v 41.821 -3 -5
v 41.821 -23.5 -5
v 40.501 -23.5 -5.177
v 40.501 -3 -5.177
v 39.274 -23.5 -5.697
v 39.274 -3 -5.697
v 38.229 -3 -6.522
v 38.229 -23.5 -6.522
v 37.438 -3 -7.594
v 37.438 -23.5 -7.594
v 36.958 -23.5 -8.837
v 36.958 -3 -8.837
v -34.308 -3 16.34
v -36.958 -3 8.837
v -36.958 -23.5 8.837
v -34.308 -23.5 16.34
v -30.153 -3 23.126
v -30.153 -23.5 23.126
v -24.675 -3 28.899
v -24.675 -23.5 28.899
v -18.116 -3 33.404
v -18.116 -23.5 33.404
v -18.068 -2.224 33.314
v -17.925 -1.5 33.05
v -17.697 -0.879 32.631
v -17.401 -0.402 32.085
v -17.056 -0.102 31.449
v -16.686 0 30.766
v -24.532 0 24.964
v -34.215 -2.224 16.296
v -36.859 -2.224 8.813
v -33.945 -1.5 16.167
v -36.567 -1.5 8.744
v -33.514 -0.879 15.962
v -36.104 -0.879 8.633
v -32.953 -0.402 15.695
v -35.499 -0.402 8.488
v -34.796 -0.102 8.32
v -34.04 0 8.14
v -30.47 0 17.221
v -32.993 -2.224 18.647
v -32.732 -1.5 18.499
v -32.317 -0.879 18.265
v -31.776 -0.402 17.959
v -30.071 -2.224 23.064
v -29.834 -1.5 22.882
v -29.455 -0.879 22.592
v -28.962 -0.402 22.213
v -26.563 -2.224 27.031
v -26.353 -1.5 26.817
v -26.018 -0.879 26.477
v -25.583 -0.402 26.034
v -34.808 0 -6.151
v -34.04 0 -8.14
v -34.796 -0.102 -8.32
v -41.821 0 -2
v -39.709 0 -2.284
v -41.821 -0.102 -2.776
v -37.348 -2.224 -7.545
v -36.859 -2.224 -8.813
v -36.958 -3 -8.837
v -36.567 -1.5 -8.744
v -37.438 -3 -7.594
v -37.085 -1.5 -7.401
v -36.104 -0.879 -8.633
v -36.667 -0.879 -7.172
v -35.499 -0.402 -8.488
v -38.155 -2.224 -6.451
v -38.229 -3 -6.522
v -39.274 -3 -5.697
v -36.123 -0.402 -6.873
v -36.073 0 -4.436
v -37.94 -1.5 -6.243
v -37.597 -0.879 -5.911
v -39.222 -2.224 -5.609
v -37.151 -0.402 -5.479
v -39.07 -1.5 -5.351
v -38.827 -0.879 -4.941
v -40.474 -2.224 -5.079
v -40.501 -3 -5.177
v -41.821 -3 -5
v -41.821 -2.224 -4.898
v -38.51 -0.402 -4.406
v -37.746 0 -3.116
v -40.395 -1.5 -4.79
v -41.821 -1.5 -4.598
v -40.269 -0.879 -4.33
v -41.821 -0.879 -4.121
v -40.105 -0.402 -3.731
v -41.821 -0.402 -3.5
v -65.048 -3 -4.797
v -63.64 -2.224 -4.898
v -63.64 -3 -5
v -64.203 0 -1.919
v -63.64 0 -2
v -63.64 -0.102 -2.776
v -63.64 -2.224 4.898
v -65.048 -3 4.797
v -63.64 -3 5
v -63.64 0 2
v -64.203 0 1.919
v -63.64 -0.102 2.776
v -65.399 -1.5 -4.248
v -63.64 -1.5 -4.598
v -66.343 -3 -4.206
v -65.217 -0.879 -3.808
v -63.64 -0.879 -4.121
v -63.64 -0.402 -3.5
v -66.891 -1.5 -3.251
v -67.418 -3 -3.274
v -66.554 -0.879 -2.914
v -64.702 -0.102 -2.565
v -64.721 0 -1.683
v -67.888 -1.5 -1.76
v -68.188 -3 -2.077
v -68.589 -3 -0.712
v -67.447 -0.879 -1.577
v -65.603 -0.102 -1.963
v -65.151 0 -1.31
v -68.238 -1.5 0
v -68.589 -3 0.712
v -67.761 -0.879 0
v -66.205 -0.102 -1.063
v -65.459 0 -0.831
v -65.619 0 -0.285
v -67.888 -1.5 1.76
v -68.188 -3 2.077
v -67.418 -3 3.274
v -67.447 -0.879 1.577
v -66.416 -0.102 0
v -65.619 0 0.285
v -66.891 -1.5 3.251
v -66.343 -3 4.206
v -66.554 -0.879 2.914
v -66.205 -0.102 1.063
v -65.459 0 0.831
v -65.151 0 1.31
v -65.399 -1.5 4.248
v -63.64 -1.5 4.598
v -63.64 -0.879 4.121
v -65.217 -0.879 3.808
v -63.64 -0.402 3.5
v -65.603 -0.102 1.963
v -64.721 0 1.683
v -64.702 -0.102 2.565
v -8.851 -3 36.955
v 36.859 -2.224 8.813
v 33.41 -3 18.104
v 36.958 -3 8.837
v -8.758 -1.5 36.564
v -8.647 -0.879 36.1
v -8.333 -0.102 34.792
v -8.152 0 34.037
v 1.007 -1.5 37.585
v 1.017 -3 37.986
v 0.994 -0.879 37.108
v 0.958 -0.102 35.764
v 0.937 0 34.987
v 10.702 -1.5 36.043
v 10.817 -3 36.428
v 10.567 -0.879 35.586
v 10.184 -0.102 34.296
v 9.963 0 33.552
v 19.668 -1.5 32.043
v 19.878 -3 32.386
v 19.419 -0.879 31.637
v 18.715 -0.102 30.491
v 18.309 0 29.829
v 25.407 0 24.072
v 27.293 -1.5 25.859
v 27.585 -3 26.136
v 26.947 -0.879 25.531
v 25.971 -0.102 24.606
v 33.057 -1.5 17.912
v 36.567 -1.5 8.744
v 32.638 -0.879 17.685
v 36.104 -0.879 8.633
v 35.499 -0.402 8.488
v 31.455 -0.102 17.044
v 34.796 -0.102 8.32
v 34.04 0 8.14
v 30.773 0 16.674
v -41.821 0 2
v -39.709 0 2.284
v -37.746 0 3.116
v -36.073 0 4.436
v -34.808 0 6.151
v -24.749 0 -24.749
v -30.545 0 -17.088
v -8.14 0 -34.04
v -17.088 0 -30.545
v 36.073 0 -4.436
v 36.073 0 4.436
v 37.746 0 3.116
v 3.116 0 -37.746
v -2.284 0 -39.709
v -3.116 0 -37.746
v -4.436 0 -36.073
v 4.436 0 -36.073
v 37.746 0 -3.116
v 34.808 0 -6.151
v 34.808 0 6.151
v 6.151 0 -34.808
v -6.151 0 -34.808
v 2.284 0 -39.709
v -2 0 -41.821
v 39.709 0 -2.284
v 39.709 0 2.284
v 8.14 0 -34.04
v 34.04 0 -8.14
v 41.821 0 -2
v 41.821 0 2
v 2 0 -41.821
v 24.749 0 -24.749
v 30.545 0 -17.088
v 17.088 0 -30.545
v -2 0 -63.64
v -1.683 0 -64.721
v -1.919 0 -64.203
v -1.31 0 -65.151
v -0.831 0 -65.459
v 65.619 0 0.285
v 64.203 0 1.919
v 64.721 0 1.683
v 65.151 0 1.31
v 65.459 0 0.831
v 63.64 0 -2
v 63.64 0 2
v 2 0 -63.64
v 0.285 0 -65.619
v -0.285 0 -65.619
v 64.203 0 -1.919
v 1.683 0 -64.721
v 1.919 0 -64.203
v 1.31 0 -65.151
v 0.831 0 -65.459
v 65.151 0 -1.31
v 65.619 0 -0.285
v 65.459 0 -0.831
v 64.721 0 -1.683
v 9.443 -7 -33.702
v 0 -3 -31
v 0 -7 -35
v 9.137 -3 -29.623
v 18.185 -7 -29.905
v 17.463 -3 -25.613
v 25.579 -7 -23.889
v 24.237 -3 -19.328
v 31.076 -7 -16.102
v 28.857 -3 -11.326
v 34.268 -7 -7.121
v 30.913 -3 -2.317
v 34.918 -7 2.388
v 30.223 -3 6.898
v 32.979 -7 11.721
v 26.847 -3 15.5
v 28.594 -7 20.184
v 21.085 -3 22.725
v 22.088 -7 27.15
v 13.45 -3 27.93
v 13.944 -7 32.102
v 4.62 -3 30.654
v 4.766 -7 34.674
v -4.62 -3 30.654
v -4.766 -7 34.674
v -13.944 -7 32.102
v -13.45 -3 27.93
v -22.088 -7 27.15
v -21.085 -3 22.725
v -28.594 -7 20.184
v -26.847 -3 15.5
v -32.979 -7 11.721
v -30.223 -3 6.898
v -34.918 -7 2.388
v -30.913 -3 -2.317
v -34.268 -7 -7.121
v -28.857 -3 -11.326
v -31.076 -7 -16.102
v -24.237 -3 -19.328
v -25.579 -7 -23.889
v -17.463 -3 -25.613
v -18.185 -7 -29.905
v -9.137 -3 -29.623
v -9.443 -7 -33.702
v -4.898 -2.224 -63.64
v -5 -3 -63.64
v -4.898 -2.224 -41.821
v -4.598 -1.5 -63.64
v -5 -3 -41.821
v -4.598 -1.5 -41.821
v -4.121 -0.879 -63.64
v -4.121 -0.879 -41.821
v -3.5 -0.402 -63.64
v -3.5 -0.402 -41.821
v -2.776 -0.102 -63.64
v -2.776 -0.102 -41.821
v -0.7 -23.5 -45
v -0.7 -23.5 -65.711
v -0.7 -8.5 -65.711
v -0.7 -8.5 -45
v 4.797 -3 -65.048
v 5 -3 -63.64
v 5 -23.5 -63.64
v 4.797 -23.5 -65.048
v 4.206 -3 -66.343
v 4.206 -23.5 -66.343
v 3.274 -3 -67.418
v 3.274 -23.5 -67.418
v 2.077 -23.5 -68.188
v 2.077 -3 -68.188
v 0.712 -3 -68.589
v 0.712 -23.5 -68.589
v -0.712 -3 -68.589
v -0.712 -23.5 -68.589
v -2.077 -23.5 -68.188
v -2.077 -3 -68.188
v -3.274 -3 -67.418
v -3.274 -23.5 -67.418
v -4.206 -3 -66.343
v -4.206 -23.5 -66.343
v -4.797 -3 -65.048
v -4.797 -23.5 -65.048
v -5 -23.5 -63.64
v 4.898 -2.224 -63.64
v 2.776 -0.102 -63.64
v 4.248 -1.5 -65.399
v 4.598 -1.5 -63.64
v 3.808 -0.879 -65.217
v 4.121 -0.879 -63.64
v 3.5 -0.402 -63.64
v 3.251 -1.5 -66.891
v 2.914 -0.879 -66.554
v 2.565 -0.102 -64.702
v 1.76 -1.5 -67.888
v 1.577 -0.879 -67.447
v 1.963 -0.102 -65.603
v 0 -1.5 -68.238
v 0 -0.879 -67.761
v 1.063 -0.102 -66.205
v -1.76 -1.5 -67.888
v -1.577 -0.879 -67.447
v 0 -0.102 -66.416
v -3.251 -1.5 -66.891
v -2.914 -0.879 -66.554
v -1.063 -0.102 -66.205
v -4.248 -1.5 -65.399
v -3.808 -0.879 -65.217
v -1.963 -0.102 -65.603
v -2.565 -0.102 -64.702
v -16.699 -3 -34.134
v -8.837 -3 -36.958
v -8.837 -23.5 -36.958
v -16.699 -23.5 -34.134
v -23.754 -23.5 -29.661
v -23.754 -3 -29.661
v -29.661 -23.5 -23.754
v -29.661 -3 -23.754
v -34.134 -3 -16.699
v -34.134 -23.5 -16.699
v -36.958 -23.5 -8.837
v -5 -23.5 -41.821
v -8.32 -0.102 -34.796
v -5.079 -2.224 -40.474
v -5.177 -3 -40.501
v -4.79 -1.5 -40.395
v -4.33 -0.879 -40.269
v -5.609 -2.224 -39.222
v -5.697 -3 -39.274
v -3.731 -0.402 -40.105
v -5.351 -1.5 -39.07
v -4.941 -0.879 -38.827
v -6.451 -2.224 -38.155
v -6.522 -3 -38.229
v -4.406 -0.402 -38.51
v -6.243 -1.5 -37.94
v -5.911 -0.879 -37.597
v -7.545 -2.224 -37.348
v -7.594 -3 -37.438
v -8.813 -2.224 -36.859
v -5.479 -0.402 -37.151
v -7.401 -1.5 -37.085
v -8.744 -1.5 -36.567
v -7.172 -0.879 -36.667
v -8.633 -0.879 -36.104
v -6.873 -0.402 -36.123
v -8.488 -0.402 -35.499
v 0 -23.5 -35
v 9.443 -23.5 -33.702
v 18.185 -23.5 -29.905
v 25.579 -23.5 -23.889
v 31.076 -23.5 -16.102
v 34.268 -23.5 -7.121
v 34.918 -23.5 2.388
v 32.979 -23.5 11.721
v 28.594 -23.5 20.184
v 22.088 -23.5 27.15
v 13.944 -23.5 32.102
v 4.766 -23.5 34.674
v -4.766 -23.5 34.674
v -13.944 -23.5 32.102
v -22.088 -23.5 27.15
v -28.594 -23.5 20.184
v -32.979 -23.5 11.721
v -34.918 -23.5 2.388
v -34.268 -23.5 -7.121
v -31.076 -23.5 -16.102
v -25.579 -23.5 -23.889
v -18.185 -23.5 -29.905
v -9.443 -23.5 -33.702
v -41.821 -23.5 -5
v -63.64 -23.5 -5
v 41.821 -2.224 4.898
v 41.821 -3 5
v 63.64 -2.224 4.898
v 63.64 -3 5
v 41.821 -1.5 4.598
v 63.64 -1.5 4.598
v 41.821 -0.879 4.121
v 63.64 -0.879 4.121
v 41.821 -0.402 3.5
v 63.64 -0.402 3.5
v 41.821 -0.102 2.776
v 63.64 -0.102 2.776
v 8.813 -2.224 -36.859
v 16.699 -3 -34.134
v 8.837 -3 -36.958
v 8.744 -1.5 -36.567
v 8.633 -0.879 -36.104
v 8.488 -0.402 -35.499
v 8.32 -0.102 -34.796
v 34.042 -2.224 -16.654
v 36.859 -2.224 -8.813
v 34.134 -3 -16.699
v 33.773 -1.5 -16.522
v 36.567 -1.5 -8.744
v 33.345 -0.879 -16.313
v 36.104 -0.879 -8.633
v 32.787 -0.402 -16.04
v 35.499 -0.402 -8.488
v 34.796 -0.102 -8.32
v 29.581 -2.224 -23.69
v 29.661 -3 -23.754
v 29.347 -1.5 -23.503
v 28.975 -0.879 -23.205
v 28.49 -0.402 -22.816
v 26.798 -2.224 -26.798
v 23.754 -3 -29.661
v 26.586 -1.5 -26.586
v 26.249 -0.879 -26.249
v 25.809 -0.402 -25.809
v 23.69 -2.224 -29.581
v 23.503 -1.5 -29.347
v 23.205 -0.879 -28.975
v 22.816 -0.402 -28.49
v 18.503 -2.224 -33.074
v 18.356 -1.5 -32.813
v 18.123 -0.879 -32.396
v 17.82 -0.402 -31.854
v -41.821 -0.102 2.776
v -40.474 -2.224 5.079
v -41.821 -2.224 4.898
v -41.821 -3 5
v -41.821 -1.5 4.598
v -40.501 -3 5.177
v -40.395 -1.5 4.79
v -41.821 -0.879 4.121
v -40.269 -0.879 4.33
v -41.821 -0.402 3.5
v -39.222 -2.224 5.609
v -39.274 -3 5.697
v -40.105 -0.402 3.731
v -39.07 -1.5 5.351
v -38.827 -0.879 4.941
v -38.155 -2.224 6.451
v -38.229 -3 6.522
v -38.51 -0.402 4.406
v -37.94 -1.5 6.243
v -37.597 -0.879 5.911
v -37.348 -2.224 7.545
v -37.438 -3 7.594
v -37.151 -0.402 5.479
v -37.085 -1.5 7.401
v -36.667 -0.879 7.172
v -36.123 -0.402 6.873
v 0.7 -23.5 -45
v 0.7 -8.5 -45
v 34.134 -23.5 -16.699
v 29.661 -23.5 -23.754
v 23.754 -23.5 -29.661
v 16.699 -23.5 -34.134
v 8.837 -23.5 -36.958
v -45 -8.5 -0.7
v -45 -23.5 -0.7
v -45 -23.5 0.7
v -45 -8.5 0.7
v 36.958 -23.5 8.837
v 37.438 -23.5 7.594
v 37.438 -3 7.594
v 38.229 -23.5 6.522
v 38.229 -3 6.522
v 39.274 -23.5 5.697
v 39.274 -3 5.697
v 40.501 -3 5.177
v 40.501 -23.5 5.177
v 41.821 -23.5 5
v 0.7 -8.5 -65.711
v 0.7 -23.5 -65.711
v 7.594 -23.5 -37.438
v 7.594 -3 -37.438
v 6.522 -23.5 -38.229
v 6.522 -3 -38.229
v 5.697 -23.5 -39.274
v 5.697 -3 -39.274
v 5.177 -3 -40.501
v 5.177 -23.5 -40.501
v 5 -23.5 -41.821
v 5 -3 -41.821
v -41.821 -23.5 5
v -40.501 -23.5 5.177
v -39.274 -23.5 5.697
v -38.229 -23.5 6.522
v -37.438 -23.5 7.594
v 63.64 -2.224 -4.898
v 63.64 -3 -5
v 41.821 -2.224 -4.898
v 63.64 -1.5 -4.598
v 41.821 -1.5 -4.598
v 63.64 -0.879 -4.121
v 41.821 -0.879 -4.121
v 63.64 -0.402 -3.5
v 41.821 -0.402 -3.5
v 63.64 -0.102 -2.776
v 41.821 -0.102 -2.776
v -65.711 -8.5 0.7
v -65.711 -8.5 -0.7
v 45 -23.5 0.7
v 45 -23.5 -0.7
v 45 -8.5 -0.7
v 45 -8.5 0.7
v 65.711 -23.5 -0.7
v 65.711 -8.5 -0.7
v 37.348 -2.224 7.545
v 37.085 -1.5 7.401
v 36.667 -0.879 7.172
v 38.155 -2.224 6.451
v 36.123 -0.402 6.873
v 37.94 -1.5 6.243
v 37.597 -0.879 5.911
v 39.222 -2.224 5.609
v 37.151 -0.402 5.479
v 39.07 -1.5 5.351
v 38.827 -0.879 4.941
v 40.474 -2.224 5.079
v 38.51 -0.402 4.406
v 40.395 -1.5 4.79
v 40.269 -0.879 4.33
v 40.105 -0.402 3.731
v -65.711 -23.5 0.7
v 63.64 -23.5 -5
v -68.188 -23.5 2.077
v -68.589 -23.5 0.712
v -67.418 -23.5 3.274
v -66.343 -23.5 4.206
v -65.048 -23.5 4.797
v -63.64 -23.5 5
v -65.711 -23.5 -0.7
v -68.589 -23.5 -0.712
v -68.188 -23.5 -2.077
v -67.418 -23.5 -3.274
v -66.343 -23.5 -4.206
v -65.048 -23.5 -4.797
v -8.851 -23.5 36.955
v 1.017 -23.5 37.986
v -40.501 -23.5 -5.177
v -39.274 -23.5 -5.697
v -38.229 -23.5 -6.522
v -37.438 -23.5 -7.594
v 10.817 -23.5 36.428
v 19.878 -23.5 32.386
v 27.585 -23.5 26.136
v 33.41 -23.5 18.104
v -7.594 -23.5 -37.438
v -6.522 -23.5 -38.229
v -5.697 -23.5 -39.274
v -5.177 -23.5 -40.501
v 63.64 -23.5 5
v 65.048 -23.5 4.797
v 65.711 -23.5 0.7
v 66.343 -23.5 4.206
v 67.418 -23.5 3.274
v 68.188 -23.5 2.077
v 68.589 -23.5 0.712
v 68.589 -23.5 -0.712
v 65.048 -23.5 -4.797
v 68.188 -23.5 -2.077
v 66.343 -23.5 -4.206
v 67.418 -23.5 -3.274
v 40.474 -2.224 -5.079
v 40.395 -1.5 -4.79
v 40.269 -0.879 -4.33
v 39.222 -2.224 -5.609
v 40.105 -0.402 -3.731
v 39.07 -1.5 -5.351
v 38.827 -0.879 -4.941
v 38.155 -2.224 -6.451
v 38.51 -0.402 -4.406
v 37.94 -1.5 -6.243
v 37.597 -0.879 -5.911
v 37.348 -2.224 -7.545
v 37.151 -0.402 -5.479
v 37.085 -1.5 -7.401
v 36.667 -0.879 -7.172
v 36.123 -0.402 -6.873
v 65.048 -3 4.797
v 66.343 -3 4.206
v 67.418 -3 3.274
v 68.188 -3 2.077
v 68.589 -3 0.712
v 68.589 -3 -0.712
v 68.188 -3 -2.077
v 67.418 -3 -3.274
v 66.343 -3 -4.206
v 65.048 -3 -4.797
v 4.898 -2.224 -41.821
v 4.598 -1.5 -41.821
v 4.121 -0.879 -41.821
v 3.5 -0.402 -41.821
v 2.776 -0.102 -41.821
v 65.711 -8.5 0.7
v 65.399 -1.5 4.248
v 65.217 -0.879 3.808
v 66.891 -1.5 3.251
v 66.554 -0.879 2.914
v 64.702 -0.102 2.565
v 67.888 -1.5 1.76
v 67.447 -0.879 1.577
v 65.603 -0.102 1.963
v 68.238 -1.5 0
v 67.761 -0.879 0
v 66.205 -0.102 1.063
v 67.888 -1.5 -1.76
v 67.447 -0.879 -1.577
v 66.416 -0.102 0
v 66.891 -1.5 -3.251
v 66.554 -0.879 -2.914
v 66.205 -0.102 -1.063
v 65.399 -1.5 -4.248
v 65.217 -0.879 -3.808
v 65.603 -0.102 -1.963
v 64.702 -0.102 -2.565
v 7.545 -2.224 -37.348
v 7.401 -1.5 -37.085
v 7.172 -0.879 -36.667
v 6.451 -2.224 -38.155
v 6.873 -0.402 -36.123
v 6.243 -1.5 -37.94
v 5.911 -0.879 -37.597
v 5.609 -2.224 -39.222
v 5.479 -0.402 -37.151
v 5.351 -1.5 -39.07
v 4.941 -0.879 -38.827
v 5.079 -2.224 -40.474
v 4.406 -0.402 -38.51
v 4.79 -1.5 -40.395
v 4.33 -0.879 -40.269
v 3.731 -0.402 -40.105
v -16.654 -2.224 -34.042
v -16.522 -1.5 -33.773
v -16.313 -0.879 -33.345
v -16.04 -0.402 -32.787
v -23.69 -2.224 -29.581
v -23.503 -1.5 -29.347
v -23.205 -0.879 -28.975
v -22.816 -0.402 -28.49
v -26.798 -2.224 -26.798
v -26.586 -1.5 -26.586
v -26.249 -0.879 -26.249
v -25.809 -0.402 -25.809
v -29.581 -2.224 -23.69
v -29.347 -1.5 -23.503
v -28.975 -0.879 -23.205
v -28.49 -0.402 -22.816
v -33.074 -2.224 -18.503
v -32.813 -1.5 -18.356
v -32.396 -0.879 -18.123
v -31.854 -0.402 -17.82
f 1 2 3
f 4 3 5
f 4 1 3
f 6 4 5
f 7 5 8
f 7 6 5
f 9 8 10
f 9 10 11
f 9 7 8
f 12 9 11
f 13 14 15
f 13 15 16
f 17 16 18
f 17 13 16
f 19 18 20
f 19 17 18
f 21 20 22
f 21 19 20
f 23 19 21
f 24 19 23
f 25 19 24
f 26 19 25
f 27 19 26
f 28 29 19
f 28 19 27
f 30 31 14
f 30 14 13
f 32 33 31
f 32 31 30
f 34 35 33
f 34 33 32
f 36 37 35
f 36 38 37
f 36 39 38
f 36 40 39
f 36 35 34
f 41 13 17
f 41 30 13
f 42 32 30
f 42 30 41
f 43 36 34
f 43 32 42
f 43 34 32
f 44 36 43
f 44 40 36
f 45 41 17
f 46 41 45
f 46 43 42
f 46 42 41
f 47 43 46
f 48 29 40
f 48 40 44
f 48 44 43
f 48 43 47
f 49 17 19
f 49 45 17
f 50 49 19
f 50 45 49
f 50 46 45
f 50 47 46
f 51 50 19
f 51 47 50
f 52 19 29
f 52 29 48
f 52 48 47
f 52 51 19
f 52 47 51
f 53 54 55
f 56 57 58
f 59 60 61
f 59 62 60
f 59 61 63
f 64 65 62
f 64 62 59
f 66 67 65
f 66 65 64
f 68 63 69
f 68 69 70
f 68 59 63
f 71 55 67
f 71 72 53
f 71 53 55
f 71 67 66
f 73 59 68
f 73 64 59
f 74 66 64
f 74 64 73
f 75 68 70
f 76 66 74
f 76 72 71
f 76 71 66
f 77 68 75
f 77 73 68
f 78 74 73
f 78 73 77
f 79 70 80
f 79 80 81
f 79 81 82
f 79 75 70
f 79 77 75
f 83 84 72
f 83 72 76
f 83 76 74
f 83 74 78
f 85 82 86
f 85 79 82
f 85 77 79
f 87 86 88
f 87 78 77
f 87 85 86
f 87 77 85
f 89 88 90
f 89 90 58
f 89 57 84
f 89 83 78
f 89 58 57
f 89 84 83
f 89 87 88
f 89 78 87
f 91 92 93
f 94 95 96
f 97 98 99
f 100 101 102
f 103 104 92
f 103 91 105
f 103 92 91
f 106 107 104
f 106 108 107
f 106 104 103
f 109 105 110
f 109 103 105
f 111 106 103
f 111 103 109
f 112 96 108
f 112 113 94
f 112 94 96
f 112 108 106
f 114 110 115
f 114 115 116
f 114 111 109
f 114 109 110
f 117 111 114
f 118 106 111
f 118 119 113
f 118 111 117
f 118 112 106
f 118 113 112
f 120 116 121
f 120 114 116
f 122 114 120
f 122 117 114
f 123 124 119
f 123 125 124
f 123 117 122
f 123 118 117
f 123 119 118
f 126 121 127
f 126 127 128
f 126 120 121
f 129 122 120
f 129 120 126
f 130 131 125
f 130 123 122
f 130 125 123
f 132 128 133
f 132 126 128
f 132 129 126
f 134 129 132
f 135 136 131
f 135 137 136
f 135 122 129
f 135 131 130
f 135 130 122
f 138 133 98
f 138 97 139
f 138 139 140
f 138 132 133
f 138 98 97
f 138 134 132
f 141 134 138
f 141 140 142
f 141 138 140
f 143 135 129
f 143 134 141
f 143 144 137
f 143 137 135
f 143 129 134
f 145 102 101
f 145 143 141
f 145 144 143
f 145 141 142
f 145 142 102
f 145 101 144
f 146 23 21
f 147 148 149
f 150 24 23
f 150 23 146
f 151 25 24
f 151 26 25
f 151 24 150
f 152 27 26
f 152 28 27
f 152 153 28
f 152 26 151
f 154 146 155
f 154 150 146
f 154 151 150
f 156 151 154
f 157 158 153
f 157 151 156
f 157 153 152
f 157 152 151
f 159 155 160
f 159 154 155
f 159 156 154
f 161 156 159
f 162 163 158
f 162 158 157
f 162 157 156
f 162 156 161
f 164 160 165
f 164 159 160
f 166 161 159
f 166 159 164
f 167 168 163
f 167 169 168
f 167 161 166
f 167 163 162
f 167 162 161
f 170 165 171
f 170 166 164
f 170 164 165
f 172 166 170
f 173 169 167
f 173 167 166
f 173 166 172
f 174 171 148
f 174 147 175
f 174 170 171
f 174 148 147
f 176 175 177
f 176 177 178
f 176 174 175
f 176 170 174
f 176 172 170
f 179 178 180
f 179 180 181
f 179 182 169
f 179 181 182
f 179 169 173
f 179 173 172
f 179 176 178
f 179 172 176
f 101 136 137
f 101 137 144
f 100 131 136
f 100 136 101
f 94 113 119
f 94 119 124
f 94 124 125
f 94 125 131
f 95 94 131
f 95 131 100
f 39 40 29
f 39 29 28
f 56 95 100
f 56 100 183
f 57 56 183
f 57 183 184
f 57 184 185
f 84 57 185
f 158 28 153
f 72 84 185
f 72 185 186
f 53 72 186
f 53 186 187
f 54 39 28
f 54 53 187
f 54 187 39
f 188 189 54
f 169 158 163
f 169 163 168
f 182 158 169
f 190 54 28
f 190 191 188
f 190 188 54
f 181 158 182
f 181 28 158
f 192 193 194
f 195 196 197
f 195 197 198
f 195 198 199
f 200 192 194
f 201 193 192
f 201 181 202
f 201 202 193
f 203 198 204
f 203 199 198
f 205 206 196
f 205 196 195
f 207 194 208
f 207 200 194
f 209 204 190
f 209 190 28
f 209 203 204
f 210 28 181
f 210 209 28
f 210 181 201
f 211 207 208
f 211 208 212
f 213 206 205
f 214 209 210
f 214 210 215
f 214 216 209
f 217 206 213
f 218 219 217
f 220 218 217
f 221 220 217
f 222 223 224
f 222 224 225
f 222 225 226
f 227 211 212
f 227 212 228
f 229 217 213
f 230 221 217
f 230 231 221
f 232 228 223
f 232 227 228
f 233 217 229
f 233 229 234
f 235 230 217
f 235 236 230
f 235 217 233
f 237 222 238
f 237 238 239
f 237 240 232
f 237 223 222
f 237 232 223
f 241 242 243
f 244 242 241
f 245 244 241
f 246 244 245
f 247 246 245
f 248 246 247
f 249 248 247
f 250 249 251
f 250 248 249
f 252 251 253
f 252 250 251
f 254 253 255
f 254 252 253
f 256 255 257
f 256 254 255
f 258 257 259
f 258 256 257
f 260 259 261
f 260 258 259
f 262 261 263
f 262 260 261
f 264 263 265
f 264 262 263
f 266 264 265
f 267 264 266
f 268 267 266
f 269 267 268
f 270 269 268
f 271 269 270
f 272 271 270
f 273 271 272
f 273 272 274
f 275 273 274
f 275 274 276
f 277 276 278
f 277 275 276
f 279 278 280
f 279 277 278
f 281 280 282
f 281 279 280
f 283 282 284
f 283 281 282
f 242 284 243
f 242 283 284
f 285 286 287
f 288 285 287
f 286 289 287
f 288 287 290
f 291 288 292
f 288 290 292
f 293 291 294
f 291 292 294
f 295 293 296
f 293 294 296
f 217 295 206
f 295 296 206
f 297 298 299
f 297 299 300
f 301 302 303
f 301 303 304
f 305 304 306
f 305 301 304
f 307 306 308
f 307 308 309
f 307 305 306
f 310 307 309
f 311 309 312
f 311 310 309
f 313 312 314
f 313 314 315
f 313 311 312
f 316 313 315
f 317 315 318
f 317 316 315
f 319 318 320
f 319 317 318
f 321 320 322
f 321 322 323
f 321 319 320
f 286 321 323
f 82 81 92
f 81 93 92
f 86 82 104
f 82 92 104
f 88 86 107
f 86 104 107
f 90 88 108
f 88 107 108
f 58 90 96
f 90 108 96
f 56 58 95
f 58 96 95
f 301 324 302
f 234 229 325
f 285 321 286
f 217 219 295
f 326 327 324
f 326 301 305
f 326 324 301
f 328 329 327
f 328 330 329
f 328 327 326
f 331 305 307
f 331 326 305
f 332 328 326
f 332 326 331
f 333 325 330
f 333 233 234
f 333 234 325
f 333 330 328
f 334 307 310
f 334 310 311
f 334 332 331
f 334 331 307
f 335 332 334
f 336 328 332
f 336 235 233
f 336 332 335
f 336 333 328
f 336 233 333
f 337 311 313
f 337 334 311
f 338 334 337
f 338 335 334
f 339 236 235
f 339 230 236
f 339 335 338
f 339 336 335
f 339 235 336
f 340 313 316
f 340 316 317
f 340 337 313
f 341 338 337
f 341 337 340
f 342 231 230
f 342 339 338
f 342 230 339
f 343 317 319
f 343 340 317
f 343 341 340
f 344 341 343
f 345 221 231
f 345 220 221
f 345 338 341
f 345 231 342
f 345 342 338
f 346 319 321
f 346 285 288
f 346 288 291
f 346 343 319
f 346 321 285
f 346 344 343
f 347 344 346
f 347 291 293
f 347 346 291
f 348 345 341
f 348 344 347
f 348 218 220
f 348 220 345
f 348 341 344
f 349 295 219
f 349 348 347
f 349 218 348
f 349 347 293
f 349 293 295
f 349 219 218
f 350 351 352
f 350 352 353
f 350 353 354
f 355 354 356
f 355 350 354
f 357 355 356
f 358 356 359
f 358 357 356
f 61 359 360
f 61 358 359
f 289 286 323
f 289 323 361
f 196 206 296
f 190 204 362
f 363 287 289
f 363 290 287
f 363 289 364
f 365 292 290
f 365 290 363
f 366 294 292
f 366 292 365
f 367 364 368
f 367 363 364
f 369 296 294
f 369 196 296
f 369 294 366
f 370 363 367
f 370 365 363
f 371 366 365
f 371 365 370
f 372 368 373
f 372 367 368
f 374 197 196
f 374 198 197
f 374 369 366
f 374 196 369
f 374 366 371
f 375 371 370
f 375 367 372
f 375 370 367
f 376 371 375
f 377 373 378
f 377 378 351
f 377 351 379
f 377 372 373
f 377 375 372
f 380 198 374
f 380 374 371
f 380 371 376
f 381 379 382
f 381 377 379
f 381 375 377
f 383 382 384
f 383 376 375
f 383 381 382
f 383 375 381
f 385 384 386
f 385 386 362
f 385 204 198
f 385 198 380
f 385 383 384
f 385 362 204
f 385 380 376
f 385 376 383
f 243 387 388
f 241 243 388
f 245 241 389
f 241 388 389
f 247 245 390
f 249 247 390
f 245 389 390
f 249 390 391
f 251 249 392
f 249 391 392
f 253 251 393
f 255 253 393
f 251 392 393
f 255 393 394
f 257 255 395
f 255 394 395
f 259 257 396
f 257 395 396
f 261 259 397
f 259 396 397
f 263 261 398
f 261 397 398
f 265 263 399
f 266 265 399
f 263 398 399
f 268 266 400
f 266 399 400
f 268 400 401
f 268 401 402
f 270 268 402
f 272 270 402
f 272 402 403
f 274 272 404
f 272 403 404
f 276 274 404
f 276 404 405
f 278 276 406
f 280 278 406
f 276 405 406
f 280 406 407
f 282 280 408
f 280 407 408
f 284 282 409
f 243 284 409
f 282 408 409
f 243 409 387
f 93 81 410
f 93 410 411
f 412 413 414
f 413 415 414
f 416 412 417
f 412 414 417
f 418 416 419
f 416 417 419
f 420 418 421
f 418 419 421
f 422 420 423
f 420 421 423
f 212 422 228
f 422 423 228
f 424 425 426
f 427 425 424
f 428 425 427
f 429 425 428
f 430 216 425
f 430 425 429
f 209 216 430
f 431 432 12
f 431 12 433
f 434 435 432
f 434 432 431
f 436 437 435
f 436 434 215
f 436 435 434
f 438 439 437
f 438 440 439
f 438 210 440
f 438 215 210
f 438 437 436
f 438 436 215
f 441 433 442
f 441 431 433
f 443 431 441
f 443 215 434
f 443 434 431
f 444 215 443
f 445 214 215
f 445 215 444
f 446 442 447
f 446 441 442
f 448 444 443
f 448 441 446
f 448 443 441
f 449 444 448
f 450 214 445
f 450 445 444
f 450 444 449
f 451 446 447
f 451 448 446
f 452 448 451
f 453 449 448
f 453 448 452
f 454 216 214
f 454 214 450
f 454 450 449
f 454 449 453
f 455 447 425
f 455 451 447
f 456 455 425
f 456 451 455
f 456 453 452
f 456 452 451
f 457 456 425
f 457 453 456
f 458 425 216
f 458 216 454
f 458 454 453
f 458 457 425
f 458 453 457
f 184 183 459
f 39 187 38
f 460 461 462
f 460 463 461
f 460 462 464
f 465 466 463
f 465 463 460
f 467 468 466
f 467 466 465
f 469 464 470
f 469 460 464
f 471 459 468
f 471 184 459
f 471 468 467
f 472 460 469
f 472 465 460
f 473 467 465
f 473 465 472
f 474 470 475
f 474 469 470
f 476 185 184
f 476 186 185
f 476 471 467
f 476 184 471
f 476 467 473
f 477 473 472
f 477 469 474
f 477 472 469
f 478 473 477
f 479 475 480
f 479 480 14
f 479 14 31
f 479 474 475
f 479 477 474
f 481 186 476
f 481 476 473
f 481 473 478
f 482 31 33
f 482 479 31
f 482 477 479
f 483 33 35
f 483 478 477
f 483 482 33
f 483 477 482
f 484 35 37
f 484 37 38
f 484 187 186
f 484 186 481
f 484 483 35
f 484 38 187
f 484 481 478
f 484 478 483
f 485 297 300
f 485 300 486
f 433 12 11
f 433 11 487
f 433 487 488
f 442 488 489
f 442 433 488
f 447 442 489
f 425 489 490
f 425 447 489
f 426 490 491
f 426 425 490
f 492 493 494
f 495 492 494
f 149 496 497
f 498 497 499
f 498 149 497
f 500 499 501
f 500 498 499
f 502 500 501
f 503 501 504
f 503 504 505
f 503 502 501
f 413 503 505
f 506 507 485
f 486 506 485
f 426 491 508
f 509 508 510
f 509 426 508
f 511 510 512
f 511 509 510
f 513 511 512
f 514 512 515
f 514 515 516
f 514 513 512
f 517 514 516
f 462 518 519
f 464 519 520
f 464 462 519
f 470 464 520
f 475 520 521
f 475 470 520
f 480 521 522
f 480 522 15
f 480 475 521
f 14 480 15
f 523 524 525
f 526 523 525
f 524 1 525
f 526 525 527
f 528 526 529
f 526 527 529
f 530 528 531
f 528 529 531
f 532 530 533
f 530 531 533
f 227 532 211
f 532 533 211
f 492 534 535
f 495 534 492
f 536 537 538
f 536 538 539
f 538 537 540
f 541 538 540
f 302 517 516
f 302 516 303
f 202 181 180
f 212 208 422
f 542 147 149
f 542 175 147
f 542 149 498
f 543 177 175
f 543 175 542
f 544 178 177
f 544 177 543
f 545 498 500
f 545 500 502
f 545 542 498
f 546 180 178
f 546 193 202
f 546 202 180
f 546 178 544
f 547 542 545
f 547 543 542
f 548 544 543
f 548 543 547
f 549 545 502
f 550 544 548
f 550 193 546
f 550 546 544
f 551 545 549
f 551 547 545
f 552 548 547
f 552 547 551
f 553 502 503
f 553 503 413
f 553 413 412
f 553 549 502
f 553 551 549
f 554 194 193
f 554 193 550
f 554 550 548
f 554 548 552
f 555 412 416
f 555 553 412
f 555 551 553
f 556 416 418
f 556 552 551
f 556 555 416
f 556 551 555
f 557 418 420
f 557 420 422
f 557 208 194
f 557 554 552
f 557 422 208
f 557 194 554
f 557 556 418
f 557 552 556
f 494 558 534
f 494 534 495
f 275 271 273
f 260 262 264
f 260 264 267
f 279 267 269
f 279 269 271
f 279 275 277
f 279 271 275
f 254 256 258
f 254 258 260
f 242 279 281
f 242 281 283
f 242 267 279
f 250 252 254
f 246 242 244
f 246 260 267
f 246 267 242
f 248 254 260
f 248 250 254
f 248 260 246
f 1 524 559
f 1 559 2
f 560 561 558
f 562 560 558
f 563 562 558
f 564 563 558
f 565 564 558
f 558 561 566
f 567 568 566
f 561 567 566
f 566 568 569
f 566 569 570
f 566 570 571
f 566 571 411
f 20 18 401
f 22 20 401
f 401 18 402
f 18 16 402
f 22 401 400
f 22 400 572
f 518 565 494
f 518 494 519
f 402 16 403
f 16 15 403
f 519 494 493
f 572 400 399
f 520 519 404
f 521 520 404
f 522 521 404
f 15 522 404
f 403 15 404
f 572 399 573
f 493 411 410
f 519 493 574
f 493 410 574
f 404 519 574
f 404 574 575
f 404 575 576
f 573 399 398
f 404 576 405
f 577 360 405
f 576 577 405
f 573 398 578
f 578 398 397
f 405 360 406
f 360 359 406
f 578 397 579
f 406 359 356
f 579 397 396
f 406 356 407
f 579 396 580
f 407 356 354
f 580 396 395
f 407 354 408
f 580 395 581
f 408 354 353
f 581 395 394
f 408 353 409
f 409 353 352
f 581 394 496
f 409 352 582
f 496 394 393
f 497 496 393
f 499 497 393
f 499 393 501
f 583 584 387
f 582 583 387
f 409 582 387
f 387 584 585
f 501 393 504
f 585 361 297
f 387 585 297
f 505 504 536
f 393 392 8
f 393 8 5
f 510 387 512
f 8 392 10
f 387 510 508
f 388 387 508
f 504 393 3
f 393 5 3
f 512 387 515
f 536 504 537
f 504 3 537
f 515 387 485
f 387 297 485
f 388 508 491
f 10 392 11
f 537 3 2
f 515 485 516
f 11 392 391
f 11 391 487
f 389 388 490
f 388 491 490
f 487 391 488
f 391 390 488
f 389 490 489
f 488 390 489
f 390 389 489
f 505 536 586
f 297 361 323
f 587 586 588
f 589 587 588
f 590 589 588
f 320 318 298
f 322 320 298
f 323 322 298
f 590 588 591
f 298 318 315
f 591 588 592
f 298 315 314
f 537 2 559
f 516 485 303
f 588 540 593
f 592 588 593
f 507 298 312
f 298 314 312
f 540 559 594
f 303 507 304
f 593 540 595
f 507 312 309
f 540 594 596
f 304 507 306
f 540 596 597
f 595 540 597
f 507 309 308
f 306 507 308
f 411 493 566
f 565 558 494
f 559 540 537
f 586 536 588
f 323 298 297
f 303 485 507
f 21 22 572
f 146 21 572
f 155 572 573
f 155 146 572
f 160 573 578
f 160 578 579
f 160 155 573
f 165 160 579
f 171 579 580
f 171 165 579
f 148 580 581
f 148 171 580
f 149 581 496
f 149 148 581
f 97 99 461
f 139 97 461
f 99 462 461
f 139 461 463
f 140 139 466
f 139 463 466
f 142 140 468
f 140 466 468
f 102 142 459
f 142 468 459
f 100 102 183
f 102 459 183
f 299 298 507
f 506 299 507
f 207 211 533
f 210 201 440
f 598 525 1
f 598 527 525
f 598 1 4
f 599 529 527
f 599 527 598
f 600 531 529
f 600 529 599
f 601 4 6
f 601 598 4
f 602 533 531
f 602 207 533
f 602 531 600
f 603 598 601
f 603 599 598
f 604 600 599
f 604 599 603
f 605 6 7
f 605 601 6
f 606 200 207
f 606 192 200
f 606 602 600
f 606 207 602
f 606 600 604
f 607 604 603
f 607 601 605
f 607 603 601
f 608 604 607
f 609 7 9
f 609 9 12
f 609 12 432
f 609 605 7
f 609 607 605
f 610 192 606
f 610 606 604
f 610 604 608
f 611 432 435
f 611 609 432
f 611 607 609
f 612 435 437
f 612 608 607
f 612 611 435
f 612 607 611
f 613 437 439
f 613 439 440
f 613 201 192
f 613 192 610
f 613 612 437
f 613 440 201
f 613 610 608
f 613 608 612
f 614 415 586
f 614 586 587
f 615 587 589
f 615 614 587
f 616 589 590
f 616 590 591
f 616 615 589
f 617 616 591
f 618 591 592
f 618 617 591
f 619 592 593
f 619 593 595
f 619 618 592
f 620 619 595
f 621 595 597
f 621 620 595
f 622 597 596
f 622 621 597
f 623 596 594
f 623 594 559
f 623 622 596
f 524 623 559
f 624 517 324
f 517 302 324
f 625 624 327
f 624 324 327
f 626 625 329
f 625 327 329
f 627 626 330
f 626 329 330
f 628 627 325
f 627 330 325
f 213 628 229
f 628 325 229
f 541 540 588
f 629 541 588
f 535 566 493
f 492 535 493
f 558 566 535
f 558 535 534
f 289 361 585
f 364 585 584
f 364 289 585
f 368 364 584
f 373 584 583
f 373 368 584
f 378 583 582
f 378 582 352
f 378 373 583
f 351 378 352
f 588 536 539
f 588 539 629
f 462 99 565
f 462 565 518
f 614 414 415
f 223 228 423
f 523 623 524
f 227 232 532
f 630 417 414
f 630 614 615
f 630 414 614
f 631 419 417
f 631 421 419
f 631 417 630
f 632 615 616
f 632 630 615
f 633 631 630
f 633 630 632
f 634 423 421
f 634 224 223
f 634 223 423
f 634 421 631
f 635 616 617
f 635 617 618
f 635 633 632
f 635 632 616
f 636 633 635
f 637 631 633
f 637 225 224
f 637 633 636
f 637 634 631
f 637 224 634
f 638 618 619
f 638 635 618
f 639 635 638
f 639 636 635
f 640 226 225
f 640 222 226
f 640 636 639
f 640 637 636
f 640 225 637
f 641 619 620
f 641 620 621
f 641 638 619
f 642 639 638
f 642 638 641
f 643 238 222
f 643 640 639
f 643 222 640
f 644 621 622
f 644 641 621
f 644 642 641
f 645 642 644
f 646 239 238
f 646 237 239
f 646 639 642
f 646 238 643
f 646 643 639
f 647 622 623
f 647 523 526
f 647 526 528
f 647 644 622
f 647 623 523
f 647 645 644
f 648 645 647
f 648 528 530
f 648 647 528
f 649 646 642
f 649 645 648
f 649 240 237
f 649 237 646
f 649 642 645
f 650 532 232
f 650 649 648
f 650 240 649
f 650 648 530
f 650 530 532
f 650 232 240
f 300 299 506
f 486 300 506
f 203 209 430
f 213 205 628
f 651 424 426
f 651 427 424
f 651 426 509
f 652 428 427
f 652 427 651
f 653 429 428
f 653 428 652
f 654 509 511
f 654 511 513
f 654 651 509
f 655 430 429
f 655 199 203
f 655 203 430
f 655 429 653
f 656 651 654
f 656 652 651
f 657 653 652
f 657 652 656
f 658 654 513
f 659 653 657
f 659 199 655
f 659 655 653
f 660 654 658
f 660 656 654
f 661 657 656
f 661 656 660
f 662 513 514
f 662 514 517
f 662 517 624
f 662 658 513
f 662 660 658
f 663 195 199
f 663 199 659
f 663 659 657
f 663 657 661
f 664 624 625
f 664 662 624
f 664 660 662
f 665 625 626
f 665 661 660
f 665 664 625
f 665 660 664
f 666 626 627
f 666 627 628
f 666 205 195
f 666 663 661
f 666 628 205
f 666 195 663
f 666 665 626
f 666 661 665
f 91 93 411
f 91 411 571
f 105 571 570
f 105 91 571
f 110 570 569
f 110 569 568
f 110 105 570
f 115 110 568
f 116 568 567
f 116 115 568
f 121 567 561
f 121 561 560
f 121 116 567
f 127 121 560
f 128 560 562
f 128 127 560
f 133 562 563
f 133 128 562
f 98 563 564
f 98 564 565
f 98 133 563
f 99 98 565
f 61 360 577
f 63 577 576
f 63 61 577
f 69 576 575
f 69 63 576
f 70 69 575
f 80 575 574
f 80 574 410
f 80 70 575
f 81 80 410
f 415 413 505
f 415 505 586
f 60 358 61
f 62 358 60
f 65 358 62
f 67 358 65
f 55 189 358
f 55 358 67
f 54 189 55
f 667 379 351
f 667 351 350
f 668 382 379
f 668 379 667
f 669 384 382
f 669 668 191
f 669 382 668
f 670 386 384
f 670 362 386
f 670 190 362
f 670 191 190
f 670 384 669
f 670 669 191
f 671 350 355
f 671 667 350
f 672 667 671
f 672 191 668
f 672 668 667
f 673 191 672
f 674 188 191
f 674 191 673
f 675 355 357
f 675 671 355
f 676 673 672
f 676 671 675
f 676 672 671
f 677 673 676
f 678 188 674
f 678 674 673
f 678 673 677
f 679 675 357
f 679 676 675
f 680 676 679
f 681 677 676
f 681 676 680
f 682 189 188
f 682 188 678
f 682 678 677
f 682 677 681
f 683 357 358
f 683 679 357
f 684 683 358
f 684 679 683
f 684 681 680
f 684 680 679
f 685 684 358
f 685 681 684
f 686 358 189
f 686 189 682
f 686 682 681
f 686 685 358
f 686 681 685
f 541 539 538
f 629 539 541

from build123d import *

# Parameters (mm, degrees)
BOSS_EXTRU_1_DEPTH      = 23.5
ESQUISSE2_W             = 20.710678119
ESQUISSE2_H             = 1.4
ESQUISSE2_W_2           = 1.4
ESQUISSE2_H_2           = 20.710678119
ENL_V_MAT_EXTRU_1_DEPTH = 15
ESQUISSE3_R             = 35
ENL_V_MAT_EXTRU_2_DEPTH = 20.5
CHANFREIN1_SIZE         = 4
CONG_1_R                = 3


with BuildPart() as part:
    # Esquisse1 → Boss.-Extru.1 (new body)
    with BuildSketch(Plane(origin=(0, 0, 0), x_dir=(1, 0, 0), z_dir=(0, 1, 0))):
        with BuildLine():
            Line((41.821047333, -5), (63.639610307, -5))
            ThreePointArc((63.639610307, -5), (68.639610307, 0), (63.639610307, 5))
            Line((63.639610307, 5), (41.821047333, 5))
            ThreePointArc((41.821047333, 5), (38.723786728, 6.074827807), (36.958134852, 8.837209302))
            ThreePointArc((36.958134852, 8.837209302), (26.870057685, 26.870057685), (8.837209302, 36.958134852))
            ThreePointArc((8.837209302, 36.958134852), (6.074827807, 38.723786728), (5, 41.821047333))
            Line((5, 41.821047333), (5, 63.639610307))
            ThreePointArc((5, 63.639610307), (0, 68.639610307), (-5, 63.639610307))
            Line((-5, 63.639610307), (-5, 41.821047333))
            ThreePointArc((-5, 41.821047333), (-6.074827807, 38.723786728), (-8.837209302, 36.958134852))
            ThreePointArc((-8.837209302, 36.958134852), (-26.870057685, 26.870057685), (-36.958134852, 8.837209302))
            ThreePointArc((-36.958134852, 8.837209302), (-38.723786728, 6.074827807), (-41.821047333, 5))
            Line((-41.821047333, 5), (-63.639610307, 5))
            ThreePointArc((-63.639610307, 5), (-68.639610307, 0), (-63.639610307, -5))
            Line((-63.639610307, -5), (-41.821047333, -5))
            ThreePointArc((-41.821047333, -5), (-38.723786728, -6.074827807), (-36.958134852, -8.837209302))
            ThreePointArc((-36.958134852, -8.837209302), (-30.152523014, -23.126291443), (-18.11627907, -33.403599097))
            ThreePointArc((-18.11627907, -33.403599097), (15.480011603, -34.704023409), (36.958134852, -8.837209302))
            ThreePointArc((36.958134852, -8.837209302), (38.723786728, -6.074827807), (41.821047333, -5))
        make_face()
    extrude(amount=-BOSS_EXTRU_1_DEPTH)

    # Esquisse2 → Enlèv. mat.-Extru.1 (cut)
    with BuildSketch(Plane.XZ.offset(23.5)):
        with Locations((55.35533906, 0)):
            Rectangle(ESQUISSE2_W, ESQUISSE2_H)
        with Locations((0, -55.35533906)):
            Rectangle(ESQUISSE2_W_2, ESQUISSE2_H_2)
        with Locations((-55.35533906, 0)):
            Rectangle(ESQUISSE2_W, ESQUISSE2_H)
    extrude(amount=-ENL_V_MAT_EXTRU_1_DEPTH, mode=Mode.SUBTRACT)

    # Esquisse3 → Enlèv. mat.-Extru.2 (cut)
    with BuildSketch(Plane.XZ.offset(23.5)):
        with Locations(Location((0, 0, 0), (0, 0, 270))):
            Circle(ESQUISSE3_R)
    extrude(amount=-ENL_V_MAT_EXTRU_2_DEPTH, mode=Mode.SUBTRACT)

    # Chanfrein1
    chanfrein1_edges = [part.edges().sort_by_distance(p)[0] for p in [
        (0, -3, 35),
    ]]
    chamfer(chanfrein1_edges, length=CHANFREIN1_SIZE)

    # Congé1
    cong_1_edges = [part.edges().sort_by_distance(p)[0] for p in [
        (68.639610307, 0, 0),
        (52.73032882, 0, -5),
        (38.723786728, 0, -6.074827807),
        (26.870057685, 0, -26.870057685),
        (6.074827807, 0, -38.723786728),
        (5, 0, -52.73032882),
        (0, 0, -68.639610307),
        (-5, 0, -52.73032882),
        (-6.074827807, 0, -38.723786728),
        (-26.870057685, 0, -26.870057685),
        (-38.723786728, 0, -6.074827807),
        (-52.73032882, 0, -5),
        (-68.639610307, 0, 0),
        (-52.73032882, 0, 5),
        (-38.723786728, 0, 6.074827807),
        (0, 0, 38),
        (38.723786728, 0, 6.074827807),
        (52.73032882, 0, 5),
    ]]
    fillet(cong_1_edges, radius=CONG_1_R)


solid = part.part
